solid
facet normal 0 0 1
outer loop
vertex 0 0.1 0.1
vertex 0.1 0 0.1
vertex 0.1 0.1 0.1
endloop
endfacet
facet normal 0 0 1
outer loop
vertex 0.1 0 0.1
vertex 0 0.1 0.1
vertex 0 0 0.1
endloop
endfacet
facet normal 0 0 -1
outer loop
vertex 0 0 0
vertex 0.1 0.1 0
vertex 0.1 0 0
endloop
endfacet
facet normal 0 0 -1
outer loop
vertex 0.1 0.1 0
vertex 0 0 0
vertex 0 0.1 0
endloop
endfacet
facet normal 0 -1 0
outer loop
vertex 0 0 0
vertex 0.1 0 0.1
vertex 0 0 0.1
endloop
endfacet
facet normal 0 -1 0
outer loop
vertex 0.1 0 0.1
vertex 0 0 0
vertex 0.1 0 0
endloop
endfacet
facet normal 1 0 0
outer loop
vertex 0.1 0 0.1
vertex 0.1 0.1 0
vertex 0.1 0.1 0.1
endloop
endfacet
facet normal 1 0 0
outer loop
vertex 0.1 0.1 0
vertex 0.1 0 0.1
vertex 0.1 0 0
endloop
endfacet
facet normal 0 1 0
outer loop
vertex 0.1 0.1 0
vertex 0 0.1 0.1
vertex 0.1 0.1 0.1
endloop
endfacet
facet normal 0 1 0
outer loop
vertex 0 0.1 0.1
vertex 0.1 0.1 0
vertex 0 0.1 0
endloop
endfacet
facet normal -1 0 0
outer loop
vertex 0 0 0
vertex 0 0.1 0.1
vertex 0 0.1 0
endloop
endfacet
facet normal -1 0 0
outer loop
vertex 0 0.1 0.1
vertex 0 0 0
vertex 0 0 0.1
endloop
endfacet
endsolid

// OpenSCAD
// file: Data.scad
dust=0;
filament=0;
gas=0;
star =
[
	[1.4,31.4,3,1063.653075],
	[4.5,92.6,3,1228.004618],
	[6,88.7,3,1063.653075],
	[6.7,74.7,3,1315.830655],
	[6.7,74.7,3,1130.316325],
	[8.9,17.9,3,2441.181106],
	[18.3,45.3,4,1475.027102],
	[20.8,98.9,3,1742.60919],
	[20.8,98.9,3,1611.387536],
	[22.2,46.1,4,3212.180934],
	[22.5,19.8,4,3518.843888],
	[23.6,18.8,4,16338.04169],
	[23.8,23.7,4,1310.991875],
	[23.8,23.7,4,1279.970617],
	[25.9,43,4,1958.844674],
	[27.8,68.5,4,1307.37447],
	[29.4,51.6,4,1090.435546],
	[31.5,34.9,3,22511.27016],
	[32.4,19.4,4,4195.657223],
	[32.6,38.1,3,7641.87624],
	[32.7,84.7,3,1618.825363],
	[34.7,42.9,3,7008.095316],
	[36.2,36.2,3,7184.557088],
	[37,35.7,3,4604.685784],
	[37.1,35.8,3,15617.08593],
	[38.9,38.2,3,6432.799273],
	[39.5,45,3,2839.226239],
	[43.9,97.6,3,11107.08256],
	[44.3,41.4,3,1274.089686],
	[45.2,61.3,3,9453.66046],
	[45.6,40.4,3,1509.384897],
	[45.6,40.4,3,1319.471457],
	[45.7,95.3,3,4685.975353],
	[48.2,78.1,3,1253.141175],
	[48.2,78.1,3,1302.566786],
	[48.7,72.2,3,1470.957077],
	[53.1,51.5,3,32448.90157],
	[56.1,0.9,3,3087.450476],
	[61,65.9,3,2135.99386],
	[61,65.9,4,2135.99386],
	[61.7,57.5,4,3787.913038],
	[62.7,45.1,4,1154.516117],
	[62.7,45.1,4,1102.554332],
	[66.8,55.6,4,1630.797361],
	[68.8,76.5,3,14521.11618],
	[68.9,76.5,3,4393.392456],
	[75.7,21.5,3,1986.094917],
	[78.9,100,3,62172.73893],
	[81.1,94,3,3144.850465],
	[84.3,18.4,3,2208.004733],
];
data = [star,filament,gas,dust];
// file: braille_font.scad
/*
Braille Module
http://creativecommons.org/licenses/by/3.0/
*/


// mm sizes from http://dots.physics.orst.edu/gs_layout.html
radius = 0.25;
spacing = 2.5;
distance = 3.75 + spacing;

plate_height = 10;
plate_thickness = 2;

$fn=35;



module letter(bitmap) {
	row_size = 2;
	col_size = 3;
	bitmap_size = row_size * col_size;
	
	function loc_x(loc) = floor(loc / row_size) * spacing + spacing;
	function loc_y(loc) = loc % row_size * spacing  + (distance-spacing)/2;

	for (loc = [0:bitmap_size - 1]) {
		if (bitmap[loc] != 0) {
			union() {
				translate(v = [loc_x(loc), loc_y(loc), 0]) {
					sphere(radius = radius* bitmap[loc], center = true);
				}
			}
		}
	}
}


module braille_char(char) {
	if (char == "A") {
		letter([
			1,0,
			0,0,
			0,0
		]);
	} else if (char == "B") {
		letter([
			1,0,
			1,0,
			0,0
		]);
	} else if (char == "C") {
		letter([
			1,1,
			0,0,
			0,0
		]);
	} else if (char == "D") {
		letter([
			1,1,
			0,1,
			0,0
		]);
	} else if (char == "E") {
		letter([
			1,0,
			0,1,
			0,0
		]);
	} else if (char == "F") {
		letter([
			1,1,
			1,0,
			0,0
		]);
	} else if (char == "G") {
		letter([
			1,1,
			1,1,
			0,0
		]);
	} else if (char == "H") {
		letter([
			1,0,
			1,1,
			0,0
		]);
	} else if (char == "I") {
		letter([
			0,1,
			1,0,
			0,0
		]);
	} else if (char == "J") {
		letter([
			0,1,
			1,1,
			0,0
		]);
	} else if (char == "K") {
		letter([
			1,0,
			0,0,
			1,0
		]);
	} else if (char == "L") {
		letter([
			1,0,
			1,0,
			1,0
		]);
	} else if (char == "M") {
		letter([
			1,1,
			0,0,
			1,0
		]);
	} else if (char == "N") {
		letter([
			1,1,
			0,1,
			1,0
		]);
	} else if (char == "O") {
		letter([
			1,0,
			0,1,
			1,0
		]);
	} else if (char == "P") {
		letter([
			1,1,
			1,0,
			1,0
		]);
	} else if (char == "Q") {
		letter([
			1,1,
			1,1,
			1,0
		]);
	} else if (char == "R") {
		letter([
			1,0,
			1,1,
			1,0
		]);
	} else if (char == "S") {
		letter([
			0,1,
			1,0,
			1,0
		]);
	} else if (char == "T") {
		letter([
			0,1,
			1,1,
			1,0
		]);
	} else if (char == "U") {
		letter([
			1,0,
			0,0,
			1,1
		]);
	} else if (char == "V") {
		letter([
			1,0,
			1,1,
			1,0
		]);
	} else if (char == "W") {
		letter([
			0,1,
			1,1,
			0,1
		]);
	} else if (char == "X") {
		letter([
			1,1,
			0,0,
			1,1
		]);
	} else if (char == "Y") {
		letter([
			1,1,
			0,1,
			1,1
		]);
	} else if (char == "Z") {
		letter([
			1,0,
			0,1,
			1,1
		]);
	} else {
		echo("Invalid Character: ", char);
	}

}

module braille_str(chars, char_count) {
	echo(str("Total Width: ", distance * char_count, "mm"));
	union() {
		for (count = [0:char_count-1]) {
			translate(v = [0, count * distance, plate_thickness]) {
				braille_char(chars[count]);
			}
		}
		translate(v = [0, -distance/2, 0]) {
			cube(size = [plate_height, distance * (char_count+1), plate_thickness]);
		}
	}
}






chars = ["C", "A", "R", "P", "E", " ", "D", "I", "E", "M" ];
char_count = 10;

union()
{
	rotate([0,90,0]) braille_str(chars, char_count);
	// uncomment next line to have a small "foot" added for better adhesion to the print platform or raft
	//translate([-19,20,-plate_height]) cube(size = [20,5,2]);
}
// main file
use <braille_font.scad>;
use <Data.scad>;
fn = 30;
pillar_diameter = 6.35;
pillar_radius = pillar_diameter/2;
pillar_height = 70;
base_boundaries = ([100,120,5]);
Title = 10;
max_plate_height = base_boundaries[2];
max_plate_height = 3;


braille_radius = 1;
braille_plate_height = 10;
braille_plate_thickness = 2;
spacing = 2.5;
distance = 3.75 + spacing;
Emboss = 1;

scaling = (.95);
transX = (1);
transY = (1);

move = -90.230965;
inkscale = 2.538071037;


star =
[
	[1.4,31.4,3,1063.653075],
	[4.5,92.6,3,1228.004618],
	[6,88.7,3,1063.653075],
	[6.7,74.7,3,1315.830655],
	[6.7,74.7,3,1130.316325],
	[8.9,17.9,3,2441.181106],
	[18.3,45.3,4,1475.027102],
	[20.8,98.9,3,1742.60919],
	[20.8,98.9,3,1611.387536],
	[22.2,46.1,4,3212.180934],
	[22.5,19.8,4,3518.843888],
	[23.6,18.8,4,16338.04169],
	[23.8,23.7,4,1310.991875],
	[23.8,23.7,4,1279.970617],
	[25.9,43,4,1958.844674],
	[27.8,68.5,4,1307.37447],
	[29.4,51.6,4,1090.435546],
	[31.5,34.9,3,22511.27016],
	[32.4,19.4,4,4195.657223],
	[32.6,38.1,3,7641.87624],
	[32.7,84.7,3,1618.825363],
	[34.7,42.9,3,7008.095316],
	[36.2,36.2,3,7184.557088],
	[37,35.7,3,4604.685784],
	[37.1,35.8,3,15617.08593],
	[38.9,38.2,3,6432.799273],
	[39.5,45,3,2839.226239],
	[43.9,97.6,3,11107.08256],
	[44.3,41.4,3,1274.089686],
	[45.2,61.3,3,9453.66046],
	[45.6,40.4,3,1509.384897],
	[45.6,40.4,3,1319.471457],
	[45.7,95.3,3,4685.975353],
	[48.2,78.1,3,1253.141175],
	[48.2,78.1,3,1302.566786],
	[48.7,72.2,3,1470.957077],
	[53.1,51.5,3,32448.90157],
	[56.1,0.9,3,3087.450476],
	[61,65.9,3,2135.99386],
	[61,65.9,4,2135.99386],
	[61.7,57.5,4,3787.913038],
	[62.7,45.1,4,1154.516117],
	[62.7,45.1,4,1102.554332],
	[66.8,55.6,4,1630.797361],
	[68.8,76.5,3,14521.11618],
	[68.9,76.5,3,4393.392456],
	[75.7,21.5,3,1986.094917],
	[78.9,100,3,62172.73893],
	[81.1,94,3,3144.850465],
	[84.3,18.4,3,2208.004733],
];

gasses = [
[21.2,36,0      ,240.6,0      ,120.3,360.9],
[26,40.7,0      ,195.8,0      ,97.9,293.7],
[26,36,0      ,188.1333333,0      ,94.06666667,282.2],
[30.5,55.1,0      ,77.2,0      ,38.6,115.8],
[30.5,50.3,0      ,116.2666667,0      ,58.13333333,174.4],
[30.5,45.5,0      ,146.4666667,0      ,73.23333333,219.7],
[30.5,40.7,0      ,127.8666667,0      ,63.93333333,191.8],
[30.5,36,0      ,285.8666667,0      ,142.9333333,428.8],
[30.5,31.2,0      ,185,0      ,92.5,277.5],
[35.3,50.3,0      ,105.2666667,0      ,52.63333333,157.9],
[35.3,45.5,0      ,112.6666667,0      ,56.33333333,169],
[35.3,40.7,0      ,116.6,0      ,58.3,174.9],
[35.3,36,0      ,303.5333333,0      ,151.7666667,455.3],
[35.3,31.2,0      ,254.2,0      ,127.1,381.3],
[39.9,50.3,0      ,76.13333333,0      ,38.06666667,114.2],
[39.9,45.5,0      ,205,0      ,102.5,307.5],
[39.9,40.7,0      ,118.4,0      ,59.2,177.6],
[39.9,36,0      ,163.4,0      ,81.7,245.1],
[39.9,31.2,0      ,208.9333333,0      ,104.4666667,313.4],
[39.9,26.4,0      ,213.8666667,0      ,106.9333333,320.8],
[44.7,59.9,0      ,104.4,0      ,52.2,156.6],
[44.7,55.1,0      ,105.2,0      ,52.6,157.8],
[44.7,50.3,0      ,107.5333333,0      ,53.76666667,161.3],
[44.7,45.5,0      ,144.5333333,0      ,72.26666667,216.8],
[44.7,40.7,0      ,158.8,0      ,79.4,238.2],
[44.7,36,0      ,154.0666667,0      ,77.03333333,231.1],
[44.7,31.2,0      ,164.7333333,0      ,82.36666667,247.1],
[44.7,26.4,0      ,172,0      ,86,258],
[44.7,21.6,0      ,151.5333333,0      ,75.76666667,227.3],
[49.2,69.4,0      ,88.26666667,0      ,44.13333333,132.4],
[49.2,64.6,0      ,99.4,0      ,49.7,149.1],
[49.2,59.9,0      ,97.93333333,0      ,48.96666667,146.9],
[49.2,55.1,0      ,127.8,0      ,63.9,191.7],
[49.2,50.3,0      ,113.6,0      ,56.8,170.4],
[49.2,45.5,0      ,143.2666667,0      ,71.63333333,214.9],
[49.2,40.7,0      ,180.3333333,0      ,90.16666667,270.5],
[49.2,36,0      ,136.8666667,0      ,68.43333333,205.3],
[49.2,31.2,0      ,142.4666667,0      ,71.23333333,213.7],
[49.2,26.4,0      ,144.3333333,0      ,72.16666667,216.5],
[49.2,21.6,0      ,112.3333333,0      ,56.16666667,168.5],
[54,69.4,0      ,96.26666667,0      ,48.13333333,144.4],
[54,64.6,0      ,106.2,0      ,53.1,159.3],
[54,59.9,0      ,111.7333333,0      ,55.86666667,167.6],
[54,55.1,0      ,145.2666667,0      ,72.63333333,217.9],
[54,50.3,0      ,226.0666667,0      ,113.0333333,339.1],
[54,45.5,0      ,165.0666667,0      ,82.53333333,247.6],
[54,40.7,0      ,181.4,0      ,90.7,272.1],
[54,36,0      ,131.1333333,0      ,65.56666667,196.7],
[54,31.2,0      ,143.7333333,0      ,71.86666667,215.6],
[54,26.4,0      ,130.5333333,0      ,65.26666667,195.8],
[54,21.6,0      ,111.5333333,0      ,55.76666667,167.3],
[54,16.8,0      ,112.2666667,0      ,56.13333333,168.4],
[58.6,59.9,0      ,152.0666667,0      ,76.03333333,228.1],
[58.6,55.1,0      ,167.7333333,0      ,83.86666667,251.6],
[58.6,50.3,0      ,120.6666667,0      ,60.33333333,181],
[58.6,45.5,0      ,149.6,0      ,74.8,224.4],
[58.6,40.7,0      ,125.8666667,0      ,62.93333333,188.8],
[58.6,36,0      ,115.4666667,0      ,57.73333333,173.2],
[58.6,31.2,0      ,124.6666667,0      ,62.33333333,187],
[58.6,26.4,0      ,114.4666667,0      ,57.23333333,171.7],
[58.6,21.6,0      ,99.13333333,0      ,49.56666667,148.7],
[58.6,16.8,0      ,83.4,0      ,41.7,125.1],
[63.4,45.5,0      ,133.3333333,0      ,66.66666667,200],
[63.4,40.7,0      ,110.4,0      ,55.2,165.6],
[63.4,36,0      ,86.66666667,0      ,43.33333333,130],
[63.4,31.2,0      ,88.13333333,0      ,44.06666667,132.2],
[63.4,26.4,0      ,93.6,0      ,46.8,140.4],
[67.9,40.7,0      ,119.3333333,0      ,59.66666667,179],
[67.9,36,0      ,75.86666667,0      ,37.93333333,113.8],
[67.9,26.4,0      ,82.4,0      ,41.2,123.6]
];




module triangle (s,h) {
//r=(s/2)/sin(60);
r = s;
	linear_extrude(height = h){
		polygon(points=[[-sin(60)*r,-sin(30)*r],[sin(60)*r,-sin(30)*r],[0,r]],triangle=[[0,1,2]]);
	}
}

Standard = 1.5;
//X-cord,Y-cord,Layer,Intensity

module star(Standard,Intensity,loc){
	translate([loc[0],loc[1],0]){
		scale([Standard,Standard,Intensity]){
			color("Purple")triangle(Standard,Intensity);
		}
	}
}

module gas(Standard,x,y,z){
	translate([x,y,0]){
		scale([Standard,Standard,1]){
			color("Magenta")cube([Standard,Standard,z]);
		}
	}
}

module drawing(i){
	if(i==1){
		scale(scaling/.95){
			translate([0,move,base_boundaries[2]/2]){
				scale(inkscale){
					color("Blue")linear_extrude(file = "v3_NGC_602.dxf", height = Emboss, layer = "Filaments");
				}
			}
		}
	}
	if(i==2||i==3||i==4){
		scale(scaling/.95){
			translate([0,move,base_boundaries[2]/2]){
				scale(inkscale){
					color("Red")linear_extrude(file = "v3_NGC_602.dxf", height = Emboss, layer = "Gasses");
				}
			}
		}
		scale(scaling/.95){
			translate([0,move,base_boundaries[2]/2]){
				scale(inkscale){
					color("White")linear_extrude(file = "v3_NGC_602.dxf", height = Emboss, layer = "Dust");
				}
			}
		}
	}
//	if(i==3||4){
//		translate([0,move,base_boundaries[2]/2]){
//			scale(inkscale){
//				color("White")linear_extrude(file = "v3_NGC_602.dxf", height = Emboss, layer = "Dust");
//			}
//		}
//	}
//	if(i==4){
//		translate([0,move,base_boundaries[2]/2]){
//			scale(inkscale){
//				color("White")linear_extrude(file = "v3_NGC_602.dxf", height = Emboss, layer = "Dust");
//			}
//		}
//	}
}

module drawing2(i){
	scale(scaling/.95){
		translate([0,move,base_boundaries[2]/2]){
			scale(inkscale){
				color("Red")linear_extrude(file = "v4_NGC_602.dxf", height = Emboss, layer = "Gasses_t");
			}
		}
	}
echo("gas pattern");
	scale(scaling/.95){
		translate([0,move,base_boundaries[2]/2]){
			scale(inkscale){
				color("White")linear_extrude(file = "v4_NGC_602.dxf", height = Emboss, layer = "Dust");
			}
		}
	}
echo("dust");
}


module tab(thickness){
	linear_extrude(height=thickness){
		difference(){
			hull(){
				circle(pillar_radius*2,$fn=fn);
				translate([pillar_radius,pillar_radius,0]){
					intersection(){
						circle(pillar_radius*2.832,$fn=fn);
						square(pillar_radius*4);
					}
				}
			}
			circle(pillar_radius,$fn=fn);
			translate([pillar_radius*3,pillar_radius*3,0]){
				rotate([0,0,45]){
					square(pillar_radius*5,center = true);
				}
			}
		}
	}
}

module pillar(pillar_radius,pillar_height){
	linear_extrude(height=pillar_height){
		circle(pillar_radius,$fn=fn);
	}
}

module base(){
	translate([0,0,0]){
		cube([base_boundaries[0],base_boundaries[1]-pillar_radius*3,base_boundaries[2]]);
	}
	translate([pillar_radius*2,base_boundaries[1]-pillar_radius*2,0]){
		rotate([0,0,-135]){
			tab(base_boundaries[2]);
		}
	}
	translate([base_boundaries[0]-pillar_radius*2,base_boundaries[1]-pillar_radius*2,0]){
		rotate([0,0,-135]){
			tab(base_boundaries[2]);
		}
	}
	translate([pillar_radius*2,base_boundaries[1]-pillar_radius*2,0]){
		pillar(pillar_radius,pillar_height);
	}
	translate([base_boundaries[0]-pillar_radius*2,base_boundaries[1]-pillar_radius*2,0]){
		pillar(pillar_radius,pillar_height);
	}
}



module plate(){
	difference(){
		translate([0,0,0]){
			cube([base_boundaries[0],base_boundaries[1]-pillar_radius*3,base_boundaries[2]-braille_radius]);
		}
		translate([-1,-1,base_boundaries[2]/2]){
			cube([base_boundaries[0]+2,base_boundaries[1]-pillar_radius*3-Title+1,base_boundaries[2]]);
		}
	}
	translate([pillar_radius*2,base_boundaries[1]-pillar_radius*2,0]){
		rotate([0,0,-135]){
			tab(max_plate_height);
		}
	}
	translate([base_boundaries[0]-pillar_radius*2,base_boundaries[1]-pillar_radius*2,0]){
		rotate([0,0,-135]){
			tab(max_plate_height);
		}
	}
}

module plate1(){
	chars = ["O", "N", "E"];
	char_count = 3;
	Total_width = distance*char_count+distance;

	translate([distance/2+base_boundaries[0]/2-Total_width/2,braille_plate_height+base_boundaries[1]-pillar_radius*3-Title,base_boundaries[2]-braille_plate_thickness-braille_radius]){
		rotate ([0,0,-90]){
			braille_str(chars, char_count);
		}
	}
	plate();
	drawing(1);
}

module plate2(){
	chars = ["T", "W", "O"];
	char_count = 3;
	Total_width = distance*char_count+distance;

	translate([distance/2+base_boundaries[0]/2-Total_width/2,braille_plate_height+base_boundaries[1]-pillar_radius*3-Title,base_boundaries[2]-braille_plate_thickness-braille_radius]){
		rotate ([0,0,-90]){
			braille_str(chars, char_count);
		}
	}
	plate();
	drawing(2);
}

module plate3(){
	chars = ["T", "H", "R", "E", "E"];
	char_count = 5;
	Total_width = distance*char_count+distance;

	translate([distance/2+base_boundaries[0]/2-Total_width/2,braille_plate_height+base_boundaries[1]-pillar_radius*3-Title,base_boundaries[2]-braille_plate_thickness-braille_radius]){
		rotate ([0,0,-90]){
			braille_str(chars, char_count);
		}
	}
	plate();
	translate([transX,transY,0]){
		scale(scaling){
			for(i=[0:49]){
				if(star[i][2]==3){
					star(Standard,log(star[i][3]),star[i]);
				}
			}
		}
	}

	drawing(3);
}

module plate4(){
	chars = ["F", "O", "U", "R"];
	char_count = 4;
	Total_width = distance*char_count+distance;

	translate([distance/2+base_boundaries[0]/2-Total_width/2,braille_plate_height+base_boundaries[1]-pillar_radius*3-Title,base_boundaries[2]-braille_plate_thickness-braille_radius]){
		rotate ([0,0,-90]){
			braille_str(chars, char_count);
		}
	}
	plate();
	translate([transX,transY,0]){
		scale(scaling){
			for(i=[0:49]){
				if(star[i][2]==4){
					star(Standard,log(star[i][3]),star[i]);
				}
			}
		}
	}
	drawing(4);
}

module assembly(i){
//	%cube(base_boundaries);

	base();

	translate([0,0,(base_boundaries[2]+i)]){
		plate4();
	}
	translate([0,0,(base_boundaries[2]+i)*2]){
		plate3();
	}
	translate([0,0,(base_boundaries[2]+i)*3]){
		plate2();
	}
	translate([0,0,(base_boundaries[2]+i)*4]){
		plate1();
	}


}

module assembly2(j){
	for(i=[0:4]){
		translate([(base_boundaries[0]*i+j*i),0,0]){
			if(i==0){
				base();
			}
			if(i==1){
				plate1();
			}
			if(i==2){
				plate2();
			}
			if(i==3){
				plate3();
			}
			if(i==4){
				plate4();
			}
		}
	}
}


cube(.1);

//plate3();
//base();




translate([62.04,28,10]){
	%cube(.3);
}




//assembly(40);


//assembly2(10);


//plate();
//
//translate([transX,transY,0]){
//	scale(scaling){
//		for(i=[0:69]){
//			gas(Standard*1.5,gasses[i][0],gasses[i][1],gasses[i][3]/30+3);
//
//		}
//	}
//}
//translate([transX,transY,0]){
//	scale(scaling){
//		for(i=[0:69]){
//			gas(Standard*1.5,gasses[i][0],gasses[i][1],gasses[i][3]/30+3);
//
//		}
//	}
//}
drawing2(4);


//plate3();
